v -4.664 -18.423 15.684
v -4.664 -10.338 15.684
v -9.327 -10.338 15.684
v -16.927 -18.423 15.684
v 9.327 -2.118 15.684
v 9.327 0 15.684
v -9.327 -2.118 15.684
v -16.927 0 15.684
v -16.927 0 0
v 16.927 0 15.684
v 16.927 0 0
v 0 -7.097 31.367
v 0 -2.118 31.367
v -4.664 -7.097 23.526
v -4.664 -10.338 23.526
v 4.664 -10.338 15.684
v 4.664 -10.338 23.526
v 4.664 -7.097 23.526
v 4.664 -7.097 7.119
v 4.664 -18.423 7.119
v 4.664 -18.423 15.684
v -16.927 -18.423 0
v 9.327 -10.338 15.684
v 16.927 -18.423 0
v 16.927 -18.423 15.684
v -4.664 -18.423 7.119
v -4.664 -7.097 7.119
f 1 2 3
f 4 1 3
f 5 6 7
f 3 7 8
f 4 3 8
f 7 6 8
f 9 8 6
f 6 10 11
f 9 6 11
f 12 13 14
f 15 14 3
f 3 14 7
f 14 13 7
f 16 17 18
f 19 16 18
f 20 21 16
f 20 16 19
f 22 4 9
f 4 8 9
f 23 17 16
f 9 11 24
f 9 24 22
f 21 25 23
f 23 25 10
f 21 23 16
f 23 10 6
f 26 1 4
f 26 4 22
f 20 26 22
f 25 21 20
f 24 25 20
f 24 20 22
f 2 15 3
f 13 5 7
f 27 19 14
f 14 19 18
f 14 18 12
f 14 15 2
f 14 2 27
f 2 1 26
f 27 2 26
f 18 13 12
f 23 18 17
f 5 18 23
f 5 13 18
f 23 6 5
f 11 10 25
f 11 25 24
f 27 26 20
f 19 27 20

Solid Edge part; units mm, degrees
sketch "Sketch1" plane through (0, 0, 0) normal (0, 1, 0) x (-1, 0, 0)
  line L0 (0, 31.3673) -> (9.3273, 15.6836)
  line L1 (9.3273, 15.6836) -> (16.9273, 15.6836)
  line L2 (16.9273, 15.6836) -> (16.9273, 0)
  line L3 (0, 0) -> (16.9273, 0)
  line L4 (-16.9273, 0) -> (0, 0)
  line L5 (-16.9273, 15.6836) -> (-16.9273, 0)
  line L6 (-9.3273, 15.6836) -> (-16.9273, 15.6836)
  line L7 (0, 31.3673) -> (-9.3273, 15.6836)
extrude "Protrusion1" add sketch "Sketch1" against normal blind 18.4227
sketch "Sketch2" plane through (-13.1273, -9.2114, 15.6836) normal (0, 0, 1) x (-1, 0, 0)
  line L0 (-3.8, -11.3294) -> (-22.4545, -11.3294)
  line L1 (-22.4545, -11.3294) -> (-22.4545, -7.0933)
  line L2 (-22.4545, -7.0933) -> (-3.8, -7.0933)
  line L3 (-3.8, -7.0933) -> (-3.8, -11.3294)
extrude "ExtrudedCutout_1" cut sketch "Sketch2" along normal blind 17.7941
sketch "Sketch3" plane through (0, -18.4227, 15.6836) normal (0, -1, 0) x (1, 0, 0)
  line L0 (9.3273, 16.873) -> (-9.3273, 16.873)
  line L1 (-9.3273, 16.873) -> (-9.3273, 0)
  line L2 (-9.3273, 0) -> (0, 0)
  line L3 (0, 0) -> (9.3273, 0)
  line L4 (9.3273, 0) -> (9.3273, 16.873)
extrude "ExtrudedCutout_2" cut sketch "Sketch3" against normal blind 8.0843
sketch "Sketch4" plane through (0, -18.4227, 7.8418) normal (0, -1, 0) x (1, 0, 0)
  line L0 (-4.6636, 26.1326) -> (4.6636, 26.1326)
  line L1 (4.6636, 7.8418) -> (4.6636, 26.1326)
  line L2 (4.6636, 7.8418) -> (4.6636, -0.7224)
  line L3 (4.6636, -0.7224) -> (0, -0.7224)
  line L4 (-4.6636, -0.7224) -> (0, -0.7224)
  line L5 (-4.6636, 7.8418) -> (-4.6636, -0.7224)
  line L6 (-4.6636, 7.8418) -> (-4.6636, 26.1326)
extrude "ExtrudedCutout_4" cut sketch "Sketch4" against normal blind 11.3261
